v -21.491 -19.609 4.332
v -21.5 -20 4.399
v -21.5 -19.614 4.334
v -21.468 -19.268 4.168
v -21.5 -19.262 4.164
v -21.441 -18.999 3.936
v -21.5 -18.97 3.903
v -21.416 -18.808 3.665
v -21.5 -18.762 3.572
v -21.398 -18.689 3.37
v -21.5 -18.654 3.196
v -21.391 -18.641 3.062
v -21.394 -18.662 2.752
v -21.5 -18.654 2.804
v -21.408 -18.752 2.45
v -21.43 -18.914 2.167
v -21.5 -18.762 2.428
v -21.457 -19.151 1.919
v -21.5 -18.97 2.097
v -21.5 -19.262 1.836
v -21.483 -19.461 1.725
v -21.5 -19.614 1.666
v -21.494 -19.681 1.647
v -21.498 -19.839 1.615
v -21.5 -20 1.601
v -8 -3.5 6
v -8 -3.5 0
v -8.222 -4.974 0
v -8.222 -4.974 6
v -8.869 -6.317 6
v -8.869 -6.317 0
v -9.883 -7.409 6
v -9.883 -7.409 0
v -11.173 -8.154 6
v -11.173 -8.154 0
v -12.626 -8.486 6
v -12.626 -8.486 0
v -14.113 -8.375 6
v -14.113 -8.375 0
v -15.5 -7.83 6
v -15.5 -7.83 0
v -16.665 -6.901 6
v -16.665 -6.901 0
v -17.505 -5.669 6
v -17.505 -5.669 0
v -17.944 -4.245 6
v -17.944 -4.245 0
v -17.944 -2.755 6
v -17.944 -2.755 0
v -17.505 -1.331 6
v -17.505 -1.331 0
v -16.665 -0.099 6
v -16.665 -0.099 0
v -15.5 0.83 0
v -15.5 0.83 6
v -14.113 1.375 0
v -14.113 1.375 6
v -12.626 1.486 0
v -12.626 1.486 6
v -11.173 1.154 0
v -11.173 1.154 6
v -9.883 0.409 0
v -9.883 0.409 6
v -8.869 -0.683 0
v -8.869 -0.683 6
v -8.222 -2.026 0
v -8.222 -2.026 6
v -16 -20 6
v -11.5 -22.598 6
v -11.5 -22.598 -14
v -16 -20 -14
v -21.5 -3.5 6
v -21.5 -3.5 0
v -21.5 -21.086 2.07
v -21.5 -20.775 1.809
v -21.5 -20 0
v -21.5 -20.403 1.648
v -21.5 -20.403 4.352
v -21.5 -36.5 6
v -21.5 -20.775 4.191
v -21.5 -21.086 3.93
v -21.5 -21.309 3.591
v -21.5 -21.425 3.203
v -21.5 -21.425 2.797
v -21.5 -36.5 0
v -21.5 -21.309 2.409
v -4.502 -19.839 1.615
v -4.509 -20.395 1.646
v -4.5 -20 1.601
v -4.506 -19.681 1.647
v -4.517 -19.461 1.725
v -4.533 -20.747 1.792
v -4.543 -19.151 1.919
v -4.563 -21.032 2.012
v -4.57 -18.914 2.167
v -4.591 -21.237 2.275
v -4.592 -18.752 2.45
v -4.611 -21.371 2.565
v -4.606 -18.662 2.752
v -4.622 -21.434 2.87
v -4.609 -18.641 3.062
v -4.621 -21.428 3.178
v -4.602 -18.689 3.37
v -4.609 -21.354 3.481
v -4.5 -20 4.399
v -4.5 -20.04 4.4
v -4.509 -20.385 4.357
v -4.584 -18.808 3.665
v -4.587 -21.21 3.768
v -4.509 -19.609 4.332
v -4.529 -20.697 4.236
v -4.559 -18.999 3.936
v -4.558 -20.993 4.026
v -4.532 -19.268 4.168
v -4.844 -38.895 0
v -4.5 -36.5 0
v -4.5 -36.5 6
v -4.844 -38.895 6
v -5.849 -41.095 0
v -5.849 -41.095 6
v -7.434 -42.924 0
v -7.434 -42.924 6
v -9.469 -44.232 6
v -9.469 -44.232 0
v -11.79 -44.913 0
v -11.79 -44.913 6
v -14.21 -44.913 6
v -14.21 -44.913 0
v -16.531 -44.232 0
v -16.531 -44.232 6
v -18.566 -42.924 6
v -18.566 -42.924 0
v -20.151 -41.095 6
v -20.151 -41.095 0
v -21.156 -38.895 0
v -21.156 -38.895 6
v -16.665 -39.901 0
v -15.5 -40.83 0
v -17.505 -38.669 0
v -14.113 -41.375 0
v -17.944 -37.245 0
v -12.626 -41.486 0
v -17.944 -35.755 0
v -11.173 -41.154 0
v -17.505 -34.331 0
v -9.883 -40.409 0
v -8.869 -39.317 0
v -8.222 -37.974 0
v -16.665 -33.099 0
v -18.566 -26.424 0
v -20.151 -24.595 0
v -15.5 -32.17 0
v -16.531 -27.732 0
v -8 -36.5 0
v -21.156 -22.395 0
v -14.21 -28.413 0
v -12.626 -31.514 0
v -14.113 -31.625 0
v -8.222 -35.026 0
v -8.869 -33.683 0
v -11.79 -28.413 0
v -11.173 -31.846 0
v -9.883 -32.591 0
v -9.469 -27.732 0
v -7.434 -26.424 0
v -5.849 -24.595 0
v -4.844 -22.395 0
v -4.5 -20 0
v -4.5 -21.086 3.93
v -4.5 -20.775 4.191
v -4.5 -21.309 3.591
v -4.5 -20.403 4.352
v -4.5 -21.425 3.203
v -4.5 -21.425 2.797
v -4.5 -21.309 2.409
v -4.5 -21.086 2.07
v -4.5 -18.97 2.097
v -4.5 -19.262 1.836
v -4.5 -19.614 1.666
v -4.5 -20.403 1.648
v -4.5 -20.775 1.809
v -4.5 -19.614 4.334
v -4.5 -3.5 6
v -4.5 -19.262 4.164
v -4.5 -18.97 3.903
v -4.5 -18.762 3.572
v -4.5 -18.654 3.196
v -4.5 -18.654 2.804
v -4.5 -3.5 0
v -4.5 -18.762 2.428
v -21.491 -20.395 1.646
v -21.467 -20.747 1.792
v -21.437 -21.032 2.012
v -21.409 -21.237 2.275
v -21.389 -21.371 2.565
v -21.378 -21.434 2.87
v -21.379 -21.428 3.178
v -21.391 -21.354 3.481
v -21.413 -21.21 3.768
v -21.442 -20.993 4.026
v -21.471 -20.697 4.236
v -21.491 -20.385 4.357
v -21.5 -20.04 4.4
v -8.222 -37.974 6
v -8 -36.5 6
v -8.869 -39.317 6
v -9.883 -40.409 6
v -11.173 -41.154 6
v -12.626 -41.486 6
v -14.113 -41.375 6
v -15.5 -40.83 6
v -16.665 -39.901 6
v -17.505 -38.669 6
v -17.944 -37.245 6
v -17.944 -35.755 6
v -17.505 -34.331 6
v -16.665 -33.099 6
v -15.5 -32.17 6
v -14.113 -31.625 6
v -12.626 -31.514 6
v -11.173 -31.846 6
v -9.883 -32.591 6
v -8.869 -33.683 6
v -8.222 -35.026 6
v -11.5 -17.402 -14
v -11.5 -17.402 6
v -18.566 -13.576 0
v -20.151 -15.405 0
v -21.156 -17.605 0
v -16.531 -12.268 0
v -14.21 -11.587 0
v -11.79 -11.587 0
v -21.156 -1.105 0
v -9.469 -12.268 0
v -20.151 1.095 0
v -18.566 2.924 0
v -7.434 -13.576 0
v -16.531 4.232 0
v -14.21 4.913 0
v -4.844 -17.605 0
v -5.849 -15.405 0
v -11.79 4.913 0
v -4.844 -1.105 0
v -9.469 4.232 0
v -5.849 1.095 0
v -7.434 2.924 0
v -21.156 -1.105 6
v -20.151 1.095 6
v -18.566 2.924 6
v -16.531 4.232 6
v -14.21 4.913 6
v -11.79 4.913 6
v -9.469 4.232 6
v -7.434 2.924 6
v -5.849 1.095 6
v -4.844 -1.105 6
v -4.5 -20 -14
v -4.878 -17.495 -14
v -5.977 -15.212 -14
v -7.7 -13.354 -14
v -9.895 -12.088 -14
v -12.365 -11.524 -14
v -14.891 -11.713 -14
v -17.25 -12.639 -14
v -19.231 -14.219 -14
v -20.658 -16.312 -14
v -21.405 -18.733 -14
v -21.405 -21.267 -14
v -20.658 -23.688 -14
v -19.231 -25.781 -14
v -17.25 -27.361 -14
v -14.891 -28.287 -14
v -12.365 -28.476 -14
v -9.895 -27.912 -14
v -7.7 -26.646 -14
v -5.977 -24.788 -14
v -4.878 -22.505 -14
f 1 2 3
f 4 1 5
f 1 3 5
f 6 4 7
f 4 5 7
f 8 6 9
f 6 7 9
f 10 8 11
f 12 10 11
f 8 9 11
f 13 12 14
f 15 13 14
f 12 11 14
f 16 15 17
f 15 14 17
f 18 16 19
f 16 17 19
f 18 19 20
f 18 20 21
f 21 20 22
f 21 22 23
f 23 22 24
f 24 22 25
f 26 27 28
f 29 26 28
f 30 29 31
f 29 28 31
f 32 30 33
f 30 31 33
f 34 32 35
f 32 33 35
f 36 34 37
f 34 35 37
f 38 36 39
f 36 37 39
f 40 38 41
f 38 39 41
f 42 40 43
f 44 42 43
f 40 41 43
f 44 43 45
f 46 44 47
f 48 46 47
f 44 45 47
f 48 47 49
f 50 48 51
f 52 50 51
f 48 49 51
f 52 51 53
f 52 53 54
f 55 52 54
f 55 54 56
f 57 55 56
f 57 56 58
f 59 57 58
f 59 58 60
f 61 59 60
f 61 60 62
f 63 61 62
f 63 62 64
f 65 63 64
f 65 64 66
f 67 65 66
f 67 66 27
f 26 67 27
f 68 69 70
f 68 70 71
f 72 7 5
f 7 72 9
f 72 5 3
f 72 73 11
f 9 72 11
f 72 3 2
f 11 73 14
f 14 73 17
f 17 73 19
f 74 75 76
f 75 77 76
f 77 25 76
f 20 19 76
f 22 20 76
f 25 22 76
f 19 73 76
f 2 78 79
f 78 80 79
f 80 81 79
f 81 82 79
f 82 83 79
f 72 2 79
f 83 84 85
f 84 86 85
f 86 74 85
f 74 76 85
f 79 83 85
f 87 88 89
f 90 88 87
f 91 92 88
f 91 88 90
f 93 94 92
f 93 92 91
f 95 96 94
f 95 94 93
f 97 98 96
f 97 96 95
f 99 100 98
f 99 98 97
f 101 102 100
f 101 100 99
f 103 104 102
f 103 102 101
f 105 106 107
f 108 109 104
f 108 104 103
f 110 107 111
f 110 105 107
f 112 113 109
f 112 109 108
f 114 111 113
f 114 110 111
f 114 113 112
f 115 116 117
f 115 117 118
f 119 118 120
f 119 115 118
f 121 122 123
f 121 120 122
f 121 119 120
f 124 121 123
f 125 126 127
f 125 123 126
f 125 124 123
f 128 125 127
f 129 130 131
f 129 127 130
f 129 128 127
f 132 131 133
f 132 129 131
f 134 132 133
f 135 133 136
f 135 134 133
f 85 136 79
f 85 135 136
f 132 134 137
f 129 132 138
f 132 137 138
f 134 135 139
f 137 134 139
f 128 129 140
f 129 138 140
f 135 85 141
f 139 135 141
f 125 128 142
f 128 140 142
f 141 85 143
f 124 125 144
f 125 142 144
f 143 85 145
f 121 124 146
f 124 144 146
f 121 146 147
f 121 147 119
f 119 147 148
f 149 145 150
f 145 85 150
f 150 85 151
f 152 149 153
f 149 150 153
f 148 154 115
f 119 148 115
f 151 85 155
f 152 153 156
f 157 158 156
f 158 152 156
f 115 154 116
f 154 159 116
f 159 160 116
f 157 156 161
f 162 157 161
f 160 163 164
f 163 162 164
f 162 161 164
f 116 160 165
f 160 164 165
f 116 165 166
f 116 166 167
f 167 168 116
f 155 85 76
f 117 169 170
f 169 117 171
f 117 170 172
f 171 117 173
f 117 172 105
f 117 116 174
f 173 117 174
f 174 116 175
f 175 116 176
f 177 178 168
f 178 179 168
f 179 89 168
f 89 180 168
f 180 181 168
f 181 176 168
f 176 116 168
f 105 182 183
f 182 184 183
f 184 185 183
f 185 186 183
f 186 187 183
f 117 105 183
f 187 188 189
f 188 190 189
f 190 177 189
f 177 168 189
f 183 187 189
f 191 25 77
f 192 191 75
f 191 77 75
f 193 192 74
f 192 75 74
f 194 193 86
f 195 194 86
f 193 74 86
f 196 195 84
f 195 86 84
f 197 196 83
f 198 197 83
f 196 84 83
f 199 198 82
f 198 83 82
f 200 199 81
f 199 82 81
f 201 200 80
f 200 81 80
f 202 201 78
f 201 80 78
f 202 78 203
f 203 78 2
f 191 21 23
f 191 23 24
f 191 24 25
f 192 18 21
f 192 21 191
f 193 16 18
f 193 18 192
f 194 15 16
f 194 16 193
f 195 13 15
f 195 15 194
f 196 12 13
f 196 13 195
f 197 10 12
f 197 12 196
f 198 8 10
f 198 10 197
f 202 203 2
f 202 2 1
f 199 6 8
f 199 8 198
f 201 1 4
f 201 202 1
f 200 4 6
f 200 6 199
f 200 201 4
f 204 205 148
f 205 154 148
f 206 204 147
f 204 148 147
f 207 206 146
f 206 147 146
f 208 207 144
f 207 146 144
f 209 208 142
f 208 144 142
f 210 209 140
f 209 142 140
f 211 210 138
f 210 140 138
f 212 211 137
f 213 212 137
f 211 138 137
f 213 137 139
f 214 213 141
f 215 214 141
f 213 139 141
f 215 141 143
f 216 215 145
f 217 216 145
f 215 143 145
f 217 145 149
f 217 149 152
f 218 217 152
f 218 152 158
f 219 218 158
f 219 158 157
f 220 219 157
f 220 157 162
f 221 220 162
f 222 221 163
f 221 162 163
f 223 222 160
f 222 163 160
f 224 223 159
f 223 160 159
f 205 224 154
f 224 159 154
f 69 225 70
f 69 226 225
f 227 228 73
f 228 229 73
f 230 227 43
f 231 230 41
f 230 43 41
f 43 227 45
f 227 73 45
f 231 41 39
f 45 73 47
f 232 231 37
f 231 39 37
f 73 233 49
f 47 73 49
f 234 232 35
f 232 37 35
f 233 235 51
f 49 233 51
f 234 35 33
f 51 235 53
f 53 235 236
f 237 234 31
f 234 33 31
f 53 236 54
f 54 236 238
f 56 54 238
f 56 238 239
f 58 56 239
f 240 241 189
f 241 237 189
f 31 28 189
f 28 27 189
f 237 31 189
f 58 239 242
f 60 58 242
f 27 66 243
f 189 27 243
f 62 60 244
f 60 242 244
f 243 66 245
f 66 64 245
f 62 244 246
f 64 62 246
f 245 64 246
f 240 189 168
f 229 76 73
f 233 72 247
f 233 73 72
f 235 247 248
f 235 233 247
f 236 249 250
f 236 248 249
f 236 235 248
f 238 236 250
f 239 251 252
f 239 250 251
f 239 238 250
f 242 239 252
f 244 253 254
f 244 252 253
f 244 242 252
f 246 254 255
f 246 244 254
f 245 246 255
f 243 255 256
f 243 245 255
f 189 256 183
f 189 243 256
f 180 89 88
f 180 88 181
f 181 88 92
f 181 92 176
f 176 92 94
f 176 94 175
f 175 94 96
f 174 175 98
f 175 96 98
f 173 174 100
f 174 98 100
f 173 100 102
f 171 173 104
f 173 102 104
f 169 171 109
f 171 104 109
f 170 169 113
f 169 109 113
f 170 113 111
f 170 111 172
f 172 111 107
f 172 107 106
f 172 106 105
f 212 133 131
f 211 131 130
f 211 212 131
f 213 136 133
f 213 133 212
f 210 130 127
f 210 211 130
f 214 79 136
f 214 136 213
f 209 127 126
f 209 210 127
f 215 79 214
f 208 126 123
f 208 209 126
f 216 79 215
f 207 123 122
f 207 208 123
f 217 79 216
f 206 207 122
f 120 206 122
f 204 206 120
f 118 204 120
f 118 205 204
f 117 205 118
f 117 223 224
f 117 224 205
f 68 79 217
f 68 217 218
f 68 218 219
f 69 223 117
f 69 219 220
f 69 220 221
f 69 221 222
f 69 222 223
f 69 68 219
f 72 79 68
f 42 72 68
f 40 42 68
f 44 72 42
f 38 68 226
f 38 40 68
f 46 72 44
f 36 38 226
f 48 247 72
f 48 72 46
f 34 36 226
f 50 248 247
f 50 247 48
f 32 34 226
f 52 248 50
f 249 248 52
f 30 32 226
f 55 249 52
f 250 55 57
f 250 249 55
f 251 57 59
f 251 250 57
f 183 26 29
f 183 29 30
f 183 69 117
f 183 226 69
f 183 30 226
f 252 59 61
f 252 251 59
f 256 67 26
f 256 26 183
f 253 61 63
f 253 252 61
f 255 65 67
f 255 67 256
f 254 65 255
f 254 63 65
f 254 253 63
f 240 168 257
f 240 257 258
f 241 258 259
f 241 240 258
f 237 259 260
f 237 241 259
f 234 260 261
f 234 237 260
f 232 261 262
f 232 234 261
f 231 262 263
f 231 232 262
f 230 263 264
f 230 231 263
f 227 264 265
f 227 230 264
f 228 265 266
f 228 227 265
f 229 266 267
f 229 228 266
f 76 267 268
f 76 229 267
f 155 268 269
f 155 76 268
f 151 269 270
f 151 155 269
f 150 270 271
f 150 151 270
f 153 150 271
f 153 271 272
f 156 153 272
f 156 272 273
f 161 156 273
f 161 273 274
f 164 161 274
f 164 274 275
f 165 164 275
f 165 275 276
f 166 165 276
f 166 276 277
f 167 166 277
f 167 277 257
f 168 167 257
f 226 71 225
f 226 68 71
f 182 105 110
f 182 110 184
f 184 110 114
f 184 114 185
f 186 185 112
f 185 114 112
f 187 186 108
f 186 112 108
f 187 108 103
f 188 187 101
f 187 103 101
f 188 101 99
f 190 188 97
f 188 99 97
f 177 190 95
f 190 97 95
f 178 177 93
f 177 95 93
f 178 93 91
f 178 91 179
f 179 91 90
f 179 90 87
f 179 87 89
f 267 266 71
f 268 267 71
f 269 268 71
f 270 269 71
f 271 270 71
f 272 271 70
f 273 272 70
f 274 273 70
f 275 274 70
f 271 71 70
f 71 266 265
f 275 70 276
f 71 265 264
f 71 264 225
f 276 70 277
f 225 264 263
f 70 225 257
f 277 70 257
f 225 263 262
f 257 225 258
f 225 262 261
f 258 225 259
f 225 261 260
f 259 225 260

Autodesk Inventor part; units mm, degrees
ref_plane "YZ Plane" through (0, 0, 0) normal (1, 0, 0) x (0, 1, 0)
ref_plane "XZ Plane" through (0, 0, 0) normal (0, 1, 0) x (-1, 0, 0)
ref_plane "XY Plane" through (0, 0, 0) normal (0, 0, 1) x (1, 0, 0)
ref_plane "Arbeitsebene1" through (0, 0, 0) normal (0, 0, 1) x (1, 0, 0)
sketch "Skizze1" plane through (0, 0, 0) normal (0, 0, 1) x (1, 0, 0)
  circle A0 centre (-13, -20) radius 11 projected
  circle A1 centre (-13, -36.5) radius 2 projected
  circle A2 centre (-13, -3.5) radius 2 projected
  line L0 (0, 0) -> (0, -9.8388) projected
  line L1 (-29, 0) -> (0, 0) projected
  line L2 (-33, -4) -> (-29, 0) projected
  line L3 (-33, -4) -> (-33, -36) projected
  line L4 (-29, -40) -> (-33, -36) projected
  line L5 (0, -40) -> (-29, -40) projected
  line L6 (0, -30.1612) -> (0, -40) projected
  arc A3 (0, -30.1612) -> (0, -9.8388) centre (-13, -20) ccw projected
  circle A4 centre (-13, -3.5) radius 5
  circle A5 centre (-13, -36.5) radius 5
  circle A6 centre (-13, -20) radius 4.5
  line L7 (-13, -3.5) -> (-13, -36.5) construction
  line L8 (-21.5, -3.5) -> (-21.5, -36.5)
  line L9 (-4.5, -36.5) -> (-4.5, -3.5)
  arc A7 (-4.5, -3.5) -> (-21.5, -3.5) centre (-13, -3.5) ccw
  arc A8 (-21.5, -36.5) -> (-4.5, -36.5) centre (-13, -36.5) ccw
  point P0 (-13, -20)
  dimension "d0" = 10
  dimension "d1" = 10
  dimension "d2" = 9
  dimension "d3" = 17
extrude "Extrusion1" add sketch "Skizze1" along normal blind 6 contours L9 A0 L8 | A0 L8 A7 L1 A4 L9 | L9 A8 L5 A5 L8 A0 | L1 A4 A7 | A8 L5 A5
sketch "Skizze2" plane through (-21.5, -36.5, 0) normal (-1, 0, 0) x (0, 0, 1)
  line L0 (6, 21) -> (0, 21) projected
  line L1 (6, 12) -> (0, 12) projected
  circle A0 centre (3, 16.4602) radius 1.4
  point P0 (0, 36.5)
  dimension "d6" = 2.8
extrude "Extrusion2" cut sketch "Skizze2" against normal through all
sketch "Skizze3" plane through (0, 0, 6) normal (0, 0, 1) x (1, 0, 0)
  point P0 (0, 0)
sketch "Skizze4" plane through (0, 0, 6) normal (0, 0, 1) x (1, 0, 0)
  line L0 (-21.5, -3.5) -> (-21.5, -36.5) projected
  arc A0 (-21.5, -36.5) -> (-4.5, -36.5) centre (-13, -36.5) ccw projected
  line L1 (-4.5, -36.5) -> (-4.5, -3.5) projected
  arc A1 (-4.5, -3.5) -> (-21.5, -3.5) centre (-13, -3.5) ccw projected
  circle A2 centre (-13, -20) radius 4.5 projected
  circle A3 centre (-13, -36.5) radius 5 projected
  circle A4 centre (-13, -3.5) radius 5 projected
  line L2 (-16, -20) -> (-11.5, -17.4019)
  line L3 (-11.5, -17.4019) -> (-11.5, -22.5981)
  line L4 (-11.5, -22.5981) -> (-16, -20)
  circle A5 centre (-13, -20) radius 1.5
  circle A6 centre (-13, -20) radius 8.5
  point P0 (0, 0)
  dimension "d9" = 3
extrude "Extrusion3" add sketch "Skizze4" against normal blind 20 contours A6 | A2
properties part number "40_XYZstage_micrometer_motorized_nema8_samplemount_lightsheet_feptube25_screwed"
